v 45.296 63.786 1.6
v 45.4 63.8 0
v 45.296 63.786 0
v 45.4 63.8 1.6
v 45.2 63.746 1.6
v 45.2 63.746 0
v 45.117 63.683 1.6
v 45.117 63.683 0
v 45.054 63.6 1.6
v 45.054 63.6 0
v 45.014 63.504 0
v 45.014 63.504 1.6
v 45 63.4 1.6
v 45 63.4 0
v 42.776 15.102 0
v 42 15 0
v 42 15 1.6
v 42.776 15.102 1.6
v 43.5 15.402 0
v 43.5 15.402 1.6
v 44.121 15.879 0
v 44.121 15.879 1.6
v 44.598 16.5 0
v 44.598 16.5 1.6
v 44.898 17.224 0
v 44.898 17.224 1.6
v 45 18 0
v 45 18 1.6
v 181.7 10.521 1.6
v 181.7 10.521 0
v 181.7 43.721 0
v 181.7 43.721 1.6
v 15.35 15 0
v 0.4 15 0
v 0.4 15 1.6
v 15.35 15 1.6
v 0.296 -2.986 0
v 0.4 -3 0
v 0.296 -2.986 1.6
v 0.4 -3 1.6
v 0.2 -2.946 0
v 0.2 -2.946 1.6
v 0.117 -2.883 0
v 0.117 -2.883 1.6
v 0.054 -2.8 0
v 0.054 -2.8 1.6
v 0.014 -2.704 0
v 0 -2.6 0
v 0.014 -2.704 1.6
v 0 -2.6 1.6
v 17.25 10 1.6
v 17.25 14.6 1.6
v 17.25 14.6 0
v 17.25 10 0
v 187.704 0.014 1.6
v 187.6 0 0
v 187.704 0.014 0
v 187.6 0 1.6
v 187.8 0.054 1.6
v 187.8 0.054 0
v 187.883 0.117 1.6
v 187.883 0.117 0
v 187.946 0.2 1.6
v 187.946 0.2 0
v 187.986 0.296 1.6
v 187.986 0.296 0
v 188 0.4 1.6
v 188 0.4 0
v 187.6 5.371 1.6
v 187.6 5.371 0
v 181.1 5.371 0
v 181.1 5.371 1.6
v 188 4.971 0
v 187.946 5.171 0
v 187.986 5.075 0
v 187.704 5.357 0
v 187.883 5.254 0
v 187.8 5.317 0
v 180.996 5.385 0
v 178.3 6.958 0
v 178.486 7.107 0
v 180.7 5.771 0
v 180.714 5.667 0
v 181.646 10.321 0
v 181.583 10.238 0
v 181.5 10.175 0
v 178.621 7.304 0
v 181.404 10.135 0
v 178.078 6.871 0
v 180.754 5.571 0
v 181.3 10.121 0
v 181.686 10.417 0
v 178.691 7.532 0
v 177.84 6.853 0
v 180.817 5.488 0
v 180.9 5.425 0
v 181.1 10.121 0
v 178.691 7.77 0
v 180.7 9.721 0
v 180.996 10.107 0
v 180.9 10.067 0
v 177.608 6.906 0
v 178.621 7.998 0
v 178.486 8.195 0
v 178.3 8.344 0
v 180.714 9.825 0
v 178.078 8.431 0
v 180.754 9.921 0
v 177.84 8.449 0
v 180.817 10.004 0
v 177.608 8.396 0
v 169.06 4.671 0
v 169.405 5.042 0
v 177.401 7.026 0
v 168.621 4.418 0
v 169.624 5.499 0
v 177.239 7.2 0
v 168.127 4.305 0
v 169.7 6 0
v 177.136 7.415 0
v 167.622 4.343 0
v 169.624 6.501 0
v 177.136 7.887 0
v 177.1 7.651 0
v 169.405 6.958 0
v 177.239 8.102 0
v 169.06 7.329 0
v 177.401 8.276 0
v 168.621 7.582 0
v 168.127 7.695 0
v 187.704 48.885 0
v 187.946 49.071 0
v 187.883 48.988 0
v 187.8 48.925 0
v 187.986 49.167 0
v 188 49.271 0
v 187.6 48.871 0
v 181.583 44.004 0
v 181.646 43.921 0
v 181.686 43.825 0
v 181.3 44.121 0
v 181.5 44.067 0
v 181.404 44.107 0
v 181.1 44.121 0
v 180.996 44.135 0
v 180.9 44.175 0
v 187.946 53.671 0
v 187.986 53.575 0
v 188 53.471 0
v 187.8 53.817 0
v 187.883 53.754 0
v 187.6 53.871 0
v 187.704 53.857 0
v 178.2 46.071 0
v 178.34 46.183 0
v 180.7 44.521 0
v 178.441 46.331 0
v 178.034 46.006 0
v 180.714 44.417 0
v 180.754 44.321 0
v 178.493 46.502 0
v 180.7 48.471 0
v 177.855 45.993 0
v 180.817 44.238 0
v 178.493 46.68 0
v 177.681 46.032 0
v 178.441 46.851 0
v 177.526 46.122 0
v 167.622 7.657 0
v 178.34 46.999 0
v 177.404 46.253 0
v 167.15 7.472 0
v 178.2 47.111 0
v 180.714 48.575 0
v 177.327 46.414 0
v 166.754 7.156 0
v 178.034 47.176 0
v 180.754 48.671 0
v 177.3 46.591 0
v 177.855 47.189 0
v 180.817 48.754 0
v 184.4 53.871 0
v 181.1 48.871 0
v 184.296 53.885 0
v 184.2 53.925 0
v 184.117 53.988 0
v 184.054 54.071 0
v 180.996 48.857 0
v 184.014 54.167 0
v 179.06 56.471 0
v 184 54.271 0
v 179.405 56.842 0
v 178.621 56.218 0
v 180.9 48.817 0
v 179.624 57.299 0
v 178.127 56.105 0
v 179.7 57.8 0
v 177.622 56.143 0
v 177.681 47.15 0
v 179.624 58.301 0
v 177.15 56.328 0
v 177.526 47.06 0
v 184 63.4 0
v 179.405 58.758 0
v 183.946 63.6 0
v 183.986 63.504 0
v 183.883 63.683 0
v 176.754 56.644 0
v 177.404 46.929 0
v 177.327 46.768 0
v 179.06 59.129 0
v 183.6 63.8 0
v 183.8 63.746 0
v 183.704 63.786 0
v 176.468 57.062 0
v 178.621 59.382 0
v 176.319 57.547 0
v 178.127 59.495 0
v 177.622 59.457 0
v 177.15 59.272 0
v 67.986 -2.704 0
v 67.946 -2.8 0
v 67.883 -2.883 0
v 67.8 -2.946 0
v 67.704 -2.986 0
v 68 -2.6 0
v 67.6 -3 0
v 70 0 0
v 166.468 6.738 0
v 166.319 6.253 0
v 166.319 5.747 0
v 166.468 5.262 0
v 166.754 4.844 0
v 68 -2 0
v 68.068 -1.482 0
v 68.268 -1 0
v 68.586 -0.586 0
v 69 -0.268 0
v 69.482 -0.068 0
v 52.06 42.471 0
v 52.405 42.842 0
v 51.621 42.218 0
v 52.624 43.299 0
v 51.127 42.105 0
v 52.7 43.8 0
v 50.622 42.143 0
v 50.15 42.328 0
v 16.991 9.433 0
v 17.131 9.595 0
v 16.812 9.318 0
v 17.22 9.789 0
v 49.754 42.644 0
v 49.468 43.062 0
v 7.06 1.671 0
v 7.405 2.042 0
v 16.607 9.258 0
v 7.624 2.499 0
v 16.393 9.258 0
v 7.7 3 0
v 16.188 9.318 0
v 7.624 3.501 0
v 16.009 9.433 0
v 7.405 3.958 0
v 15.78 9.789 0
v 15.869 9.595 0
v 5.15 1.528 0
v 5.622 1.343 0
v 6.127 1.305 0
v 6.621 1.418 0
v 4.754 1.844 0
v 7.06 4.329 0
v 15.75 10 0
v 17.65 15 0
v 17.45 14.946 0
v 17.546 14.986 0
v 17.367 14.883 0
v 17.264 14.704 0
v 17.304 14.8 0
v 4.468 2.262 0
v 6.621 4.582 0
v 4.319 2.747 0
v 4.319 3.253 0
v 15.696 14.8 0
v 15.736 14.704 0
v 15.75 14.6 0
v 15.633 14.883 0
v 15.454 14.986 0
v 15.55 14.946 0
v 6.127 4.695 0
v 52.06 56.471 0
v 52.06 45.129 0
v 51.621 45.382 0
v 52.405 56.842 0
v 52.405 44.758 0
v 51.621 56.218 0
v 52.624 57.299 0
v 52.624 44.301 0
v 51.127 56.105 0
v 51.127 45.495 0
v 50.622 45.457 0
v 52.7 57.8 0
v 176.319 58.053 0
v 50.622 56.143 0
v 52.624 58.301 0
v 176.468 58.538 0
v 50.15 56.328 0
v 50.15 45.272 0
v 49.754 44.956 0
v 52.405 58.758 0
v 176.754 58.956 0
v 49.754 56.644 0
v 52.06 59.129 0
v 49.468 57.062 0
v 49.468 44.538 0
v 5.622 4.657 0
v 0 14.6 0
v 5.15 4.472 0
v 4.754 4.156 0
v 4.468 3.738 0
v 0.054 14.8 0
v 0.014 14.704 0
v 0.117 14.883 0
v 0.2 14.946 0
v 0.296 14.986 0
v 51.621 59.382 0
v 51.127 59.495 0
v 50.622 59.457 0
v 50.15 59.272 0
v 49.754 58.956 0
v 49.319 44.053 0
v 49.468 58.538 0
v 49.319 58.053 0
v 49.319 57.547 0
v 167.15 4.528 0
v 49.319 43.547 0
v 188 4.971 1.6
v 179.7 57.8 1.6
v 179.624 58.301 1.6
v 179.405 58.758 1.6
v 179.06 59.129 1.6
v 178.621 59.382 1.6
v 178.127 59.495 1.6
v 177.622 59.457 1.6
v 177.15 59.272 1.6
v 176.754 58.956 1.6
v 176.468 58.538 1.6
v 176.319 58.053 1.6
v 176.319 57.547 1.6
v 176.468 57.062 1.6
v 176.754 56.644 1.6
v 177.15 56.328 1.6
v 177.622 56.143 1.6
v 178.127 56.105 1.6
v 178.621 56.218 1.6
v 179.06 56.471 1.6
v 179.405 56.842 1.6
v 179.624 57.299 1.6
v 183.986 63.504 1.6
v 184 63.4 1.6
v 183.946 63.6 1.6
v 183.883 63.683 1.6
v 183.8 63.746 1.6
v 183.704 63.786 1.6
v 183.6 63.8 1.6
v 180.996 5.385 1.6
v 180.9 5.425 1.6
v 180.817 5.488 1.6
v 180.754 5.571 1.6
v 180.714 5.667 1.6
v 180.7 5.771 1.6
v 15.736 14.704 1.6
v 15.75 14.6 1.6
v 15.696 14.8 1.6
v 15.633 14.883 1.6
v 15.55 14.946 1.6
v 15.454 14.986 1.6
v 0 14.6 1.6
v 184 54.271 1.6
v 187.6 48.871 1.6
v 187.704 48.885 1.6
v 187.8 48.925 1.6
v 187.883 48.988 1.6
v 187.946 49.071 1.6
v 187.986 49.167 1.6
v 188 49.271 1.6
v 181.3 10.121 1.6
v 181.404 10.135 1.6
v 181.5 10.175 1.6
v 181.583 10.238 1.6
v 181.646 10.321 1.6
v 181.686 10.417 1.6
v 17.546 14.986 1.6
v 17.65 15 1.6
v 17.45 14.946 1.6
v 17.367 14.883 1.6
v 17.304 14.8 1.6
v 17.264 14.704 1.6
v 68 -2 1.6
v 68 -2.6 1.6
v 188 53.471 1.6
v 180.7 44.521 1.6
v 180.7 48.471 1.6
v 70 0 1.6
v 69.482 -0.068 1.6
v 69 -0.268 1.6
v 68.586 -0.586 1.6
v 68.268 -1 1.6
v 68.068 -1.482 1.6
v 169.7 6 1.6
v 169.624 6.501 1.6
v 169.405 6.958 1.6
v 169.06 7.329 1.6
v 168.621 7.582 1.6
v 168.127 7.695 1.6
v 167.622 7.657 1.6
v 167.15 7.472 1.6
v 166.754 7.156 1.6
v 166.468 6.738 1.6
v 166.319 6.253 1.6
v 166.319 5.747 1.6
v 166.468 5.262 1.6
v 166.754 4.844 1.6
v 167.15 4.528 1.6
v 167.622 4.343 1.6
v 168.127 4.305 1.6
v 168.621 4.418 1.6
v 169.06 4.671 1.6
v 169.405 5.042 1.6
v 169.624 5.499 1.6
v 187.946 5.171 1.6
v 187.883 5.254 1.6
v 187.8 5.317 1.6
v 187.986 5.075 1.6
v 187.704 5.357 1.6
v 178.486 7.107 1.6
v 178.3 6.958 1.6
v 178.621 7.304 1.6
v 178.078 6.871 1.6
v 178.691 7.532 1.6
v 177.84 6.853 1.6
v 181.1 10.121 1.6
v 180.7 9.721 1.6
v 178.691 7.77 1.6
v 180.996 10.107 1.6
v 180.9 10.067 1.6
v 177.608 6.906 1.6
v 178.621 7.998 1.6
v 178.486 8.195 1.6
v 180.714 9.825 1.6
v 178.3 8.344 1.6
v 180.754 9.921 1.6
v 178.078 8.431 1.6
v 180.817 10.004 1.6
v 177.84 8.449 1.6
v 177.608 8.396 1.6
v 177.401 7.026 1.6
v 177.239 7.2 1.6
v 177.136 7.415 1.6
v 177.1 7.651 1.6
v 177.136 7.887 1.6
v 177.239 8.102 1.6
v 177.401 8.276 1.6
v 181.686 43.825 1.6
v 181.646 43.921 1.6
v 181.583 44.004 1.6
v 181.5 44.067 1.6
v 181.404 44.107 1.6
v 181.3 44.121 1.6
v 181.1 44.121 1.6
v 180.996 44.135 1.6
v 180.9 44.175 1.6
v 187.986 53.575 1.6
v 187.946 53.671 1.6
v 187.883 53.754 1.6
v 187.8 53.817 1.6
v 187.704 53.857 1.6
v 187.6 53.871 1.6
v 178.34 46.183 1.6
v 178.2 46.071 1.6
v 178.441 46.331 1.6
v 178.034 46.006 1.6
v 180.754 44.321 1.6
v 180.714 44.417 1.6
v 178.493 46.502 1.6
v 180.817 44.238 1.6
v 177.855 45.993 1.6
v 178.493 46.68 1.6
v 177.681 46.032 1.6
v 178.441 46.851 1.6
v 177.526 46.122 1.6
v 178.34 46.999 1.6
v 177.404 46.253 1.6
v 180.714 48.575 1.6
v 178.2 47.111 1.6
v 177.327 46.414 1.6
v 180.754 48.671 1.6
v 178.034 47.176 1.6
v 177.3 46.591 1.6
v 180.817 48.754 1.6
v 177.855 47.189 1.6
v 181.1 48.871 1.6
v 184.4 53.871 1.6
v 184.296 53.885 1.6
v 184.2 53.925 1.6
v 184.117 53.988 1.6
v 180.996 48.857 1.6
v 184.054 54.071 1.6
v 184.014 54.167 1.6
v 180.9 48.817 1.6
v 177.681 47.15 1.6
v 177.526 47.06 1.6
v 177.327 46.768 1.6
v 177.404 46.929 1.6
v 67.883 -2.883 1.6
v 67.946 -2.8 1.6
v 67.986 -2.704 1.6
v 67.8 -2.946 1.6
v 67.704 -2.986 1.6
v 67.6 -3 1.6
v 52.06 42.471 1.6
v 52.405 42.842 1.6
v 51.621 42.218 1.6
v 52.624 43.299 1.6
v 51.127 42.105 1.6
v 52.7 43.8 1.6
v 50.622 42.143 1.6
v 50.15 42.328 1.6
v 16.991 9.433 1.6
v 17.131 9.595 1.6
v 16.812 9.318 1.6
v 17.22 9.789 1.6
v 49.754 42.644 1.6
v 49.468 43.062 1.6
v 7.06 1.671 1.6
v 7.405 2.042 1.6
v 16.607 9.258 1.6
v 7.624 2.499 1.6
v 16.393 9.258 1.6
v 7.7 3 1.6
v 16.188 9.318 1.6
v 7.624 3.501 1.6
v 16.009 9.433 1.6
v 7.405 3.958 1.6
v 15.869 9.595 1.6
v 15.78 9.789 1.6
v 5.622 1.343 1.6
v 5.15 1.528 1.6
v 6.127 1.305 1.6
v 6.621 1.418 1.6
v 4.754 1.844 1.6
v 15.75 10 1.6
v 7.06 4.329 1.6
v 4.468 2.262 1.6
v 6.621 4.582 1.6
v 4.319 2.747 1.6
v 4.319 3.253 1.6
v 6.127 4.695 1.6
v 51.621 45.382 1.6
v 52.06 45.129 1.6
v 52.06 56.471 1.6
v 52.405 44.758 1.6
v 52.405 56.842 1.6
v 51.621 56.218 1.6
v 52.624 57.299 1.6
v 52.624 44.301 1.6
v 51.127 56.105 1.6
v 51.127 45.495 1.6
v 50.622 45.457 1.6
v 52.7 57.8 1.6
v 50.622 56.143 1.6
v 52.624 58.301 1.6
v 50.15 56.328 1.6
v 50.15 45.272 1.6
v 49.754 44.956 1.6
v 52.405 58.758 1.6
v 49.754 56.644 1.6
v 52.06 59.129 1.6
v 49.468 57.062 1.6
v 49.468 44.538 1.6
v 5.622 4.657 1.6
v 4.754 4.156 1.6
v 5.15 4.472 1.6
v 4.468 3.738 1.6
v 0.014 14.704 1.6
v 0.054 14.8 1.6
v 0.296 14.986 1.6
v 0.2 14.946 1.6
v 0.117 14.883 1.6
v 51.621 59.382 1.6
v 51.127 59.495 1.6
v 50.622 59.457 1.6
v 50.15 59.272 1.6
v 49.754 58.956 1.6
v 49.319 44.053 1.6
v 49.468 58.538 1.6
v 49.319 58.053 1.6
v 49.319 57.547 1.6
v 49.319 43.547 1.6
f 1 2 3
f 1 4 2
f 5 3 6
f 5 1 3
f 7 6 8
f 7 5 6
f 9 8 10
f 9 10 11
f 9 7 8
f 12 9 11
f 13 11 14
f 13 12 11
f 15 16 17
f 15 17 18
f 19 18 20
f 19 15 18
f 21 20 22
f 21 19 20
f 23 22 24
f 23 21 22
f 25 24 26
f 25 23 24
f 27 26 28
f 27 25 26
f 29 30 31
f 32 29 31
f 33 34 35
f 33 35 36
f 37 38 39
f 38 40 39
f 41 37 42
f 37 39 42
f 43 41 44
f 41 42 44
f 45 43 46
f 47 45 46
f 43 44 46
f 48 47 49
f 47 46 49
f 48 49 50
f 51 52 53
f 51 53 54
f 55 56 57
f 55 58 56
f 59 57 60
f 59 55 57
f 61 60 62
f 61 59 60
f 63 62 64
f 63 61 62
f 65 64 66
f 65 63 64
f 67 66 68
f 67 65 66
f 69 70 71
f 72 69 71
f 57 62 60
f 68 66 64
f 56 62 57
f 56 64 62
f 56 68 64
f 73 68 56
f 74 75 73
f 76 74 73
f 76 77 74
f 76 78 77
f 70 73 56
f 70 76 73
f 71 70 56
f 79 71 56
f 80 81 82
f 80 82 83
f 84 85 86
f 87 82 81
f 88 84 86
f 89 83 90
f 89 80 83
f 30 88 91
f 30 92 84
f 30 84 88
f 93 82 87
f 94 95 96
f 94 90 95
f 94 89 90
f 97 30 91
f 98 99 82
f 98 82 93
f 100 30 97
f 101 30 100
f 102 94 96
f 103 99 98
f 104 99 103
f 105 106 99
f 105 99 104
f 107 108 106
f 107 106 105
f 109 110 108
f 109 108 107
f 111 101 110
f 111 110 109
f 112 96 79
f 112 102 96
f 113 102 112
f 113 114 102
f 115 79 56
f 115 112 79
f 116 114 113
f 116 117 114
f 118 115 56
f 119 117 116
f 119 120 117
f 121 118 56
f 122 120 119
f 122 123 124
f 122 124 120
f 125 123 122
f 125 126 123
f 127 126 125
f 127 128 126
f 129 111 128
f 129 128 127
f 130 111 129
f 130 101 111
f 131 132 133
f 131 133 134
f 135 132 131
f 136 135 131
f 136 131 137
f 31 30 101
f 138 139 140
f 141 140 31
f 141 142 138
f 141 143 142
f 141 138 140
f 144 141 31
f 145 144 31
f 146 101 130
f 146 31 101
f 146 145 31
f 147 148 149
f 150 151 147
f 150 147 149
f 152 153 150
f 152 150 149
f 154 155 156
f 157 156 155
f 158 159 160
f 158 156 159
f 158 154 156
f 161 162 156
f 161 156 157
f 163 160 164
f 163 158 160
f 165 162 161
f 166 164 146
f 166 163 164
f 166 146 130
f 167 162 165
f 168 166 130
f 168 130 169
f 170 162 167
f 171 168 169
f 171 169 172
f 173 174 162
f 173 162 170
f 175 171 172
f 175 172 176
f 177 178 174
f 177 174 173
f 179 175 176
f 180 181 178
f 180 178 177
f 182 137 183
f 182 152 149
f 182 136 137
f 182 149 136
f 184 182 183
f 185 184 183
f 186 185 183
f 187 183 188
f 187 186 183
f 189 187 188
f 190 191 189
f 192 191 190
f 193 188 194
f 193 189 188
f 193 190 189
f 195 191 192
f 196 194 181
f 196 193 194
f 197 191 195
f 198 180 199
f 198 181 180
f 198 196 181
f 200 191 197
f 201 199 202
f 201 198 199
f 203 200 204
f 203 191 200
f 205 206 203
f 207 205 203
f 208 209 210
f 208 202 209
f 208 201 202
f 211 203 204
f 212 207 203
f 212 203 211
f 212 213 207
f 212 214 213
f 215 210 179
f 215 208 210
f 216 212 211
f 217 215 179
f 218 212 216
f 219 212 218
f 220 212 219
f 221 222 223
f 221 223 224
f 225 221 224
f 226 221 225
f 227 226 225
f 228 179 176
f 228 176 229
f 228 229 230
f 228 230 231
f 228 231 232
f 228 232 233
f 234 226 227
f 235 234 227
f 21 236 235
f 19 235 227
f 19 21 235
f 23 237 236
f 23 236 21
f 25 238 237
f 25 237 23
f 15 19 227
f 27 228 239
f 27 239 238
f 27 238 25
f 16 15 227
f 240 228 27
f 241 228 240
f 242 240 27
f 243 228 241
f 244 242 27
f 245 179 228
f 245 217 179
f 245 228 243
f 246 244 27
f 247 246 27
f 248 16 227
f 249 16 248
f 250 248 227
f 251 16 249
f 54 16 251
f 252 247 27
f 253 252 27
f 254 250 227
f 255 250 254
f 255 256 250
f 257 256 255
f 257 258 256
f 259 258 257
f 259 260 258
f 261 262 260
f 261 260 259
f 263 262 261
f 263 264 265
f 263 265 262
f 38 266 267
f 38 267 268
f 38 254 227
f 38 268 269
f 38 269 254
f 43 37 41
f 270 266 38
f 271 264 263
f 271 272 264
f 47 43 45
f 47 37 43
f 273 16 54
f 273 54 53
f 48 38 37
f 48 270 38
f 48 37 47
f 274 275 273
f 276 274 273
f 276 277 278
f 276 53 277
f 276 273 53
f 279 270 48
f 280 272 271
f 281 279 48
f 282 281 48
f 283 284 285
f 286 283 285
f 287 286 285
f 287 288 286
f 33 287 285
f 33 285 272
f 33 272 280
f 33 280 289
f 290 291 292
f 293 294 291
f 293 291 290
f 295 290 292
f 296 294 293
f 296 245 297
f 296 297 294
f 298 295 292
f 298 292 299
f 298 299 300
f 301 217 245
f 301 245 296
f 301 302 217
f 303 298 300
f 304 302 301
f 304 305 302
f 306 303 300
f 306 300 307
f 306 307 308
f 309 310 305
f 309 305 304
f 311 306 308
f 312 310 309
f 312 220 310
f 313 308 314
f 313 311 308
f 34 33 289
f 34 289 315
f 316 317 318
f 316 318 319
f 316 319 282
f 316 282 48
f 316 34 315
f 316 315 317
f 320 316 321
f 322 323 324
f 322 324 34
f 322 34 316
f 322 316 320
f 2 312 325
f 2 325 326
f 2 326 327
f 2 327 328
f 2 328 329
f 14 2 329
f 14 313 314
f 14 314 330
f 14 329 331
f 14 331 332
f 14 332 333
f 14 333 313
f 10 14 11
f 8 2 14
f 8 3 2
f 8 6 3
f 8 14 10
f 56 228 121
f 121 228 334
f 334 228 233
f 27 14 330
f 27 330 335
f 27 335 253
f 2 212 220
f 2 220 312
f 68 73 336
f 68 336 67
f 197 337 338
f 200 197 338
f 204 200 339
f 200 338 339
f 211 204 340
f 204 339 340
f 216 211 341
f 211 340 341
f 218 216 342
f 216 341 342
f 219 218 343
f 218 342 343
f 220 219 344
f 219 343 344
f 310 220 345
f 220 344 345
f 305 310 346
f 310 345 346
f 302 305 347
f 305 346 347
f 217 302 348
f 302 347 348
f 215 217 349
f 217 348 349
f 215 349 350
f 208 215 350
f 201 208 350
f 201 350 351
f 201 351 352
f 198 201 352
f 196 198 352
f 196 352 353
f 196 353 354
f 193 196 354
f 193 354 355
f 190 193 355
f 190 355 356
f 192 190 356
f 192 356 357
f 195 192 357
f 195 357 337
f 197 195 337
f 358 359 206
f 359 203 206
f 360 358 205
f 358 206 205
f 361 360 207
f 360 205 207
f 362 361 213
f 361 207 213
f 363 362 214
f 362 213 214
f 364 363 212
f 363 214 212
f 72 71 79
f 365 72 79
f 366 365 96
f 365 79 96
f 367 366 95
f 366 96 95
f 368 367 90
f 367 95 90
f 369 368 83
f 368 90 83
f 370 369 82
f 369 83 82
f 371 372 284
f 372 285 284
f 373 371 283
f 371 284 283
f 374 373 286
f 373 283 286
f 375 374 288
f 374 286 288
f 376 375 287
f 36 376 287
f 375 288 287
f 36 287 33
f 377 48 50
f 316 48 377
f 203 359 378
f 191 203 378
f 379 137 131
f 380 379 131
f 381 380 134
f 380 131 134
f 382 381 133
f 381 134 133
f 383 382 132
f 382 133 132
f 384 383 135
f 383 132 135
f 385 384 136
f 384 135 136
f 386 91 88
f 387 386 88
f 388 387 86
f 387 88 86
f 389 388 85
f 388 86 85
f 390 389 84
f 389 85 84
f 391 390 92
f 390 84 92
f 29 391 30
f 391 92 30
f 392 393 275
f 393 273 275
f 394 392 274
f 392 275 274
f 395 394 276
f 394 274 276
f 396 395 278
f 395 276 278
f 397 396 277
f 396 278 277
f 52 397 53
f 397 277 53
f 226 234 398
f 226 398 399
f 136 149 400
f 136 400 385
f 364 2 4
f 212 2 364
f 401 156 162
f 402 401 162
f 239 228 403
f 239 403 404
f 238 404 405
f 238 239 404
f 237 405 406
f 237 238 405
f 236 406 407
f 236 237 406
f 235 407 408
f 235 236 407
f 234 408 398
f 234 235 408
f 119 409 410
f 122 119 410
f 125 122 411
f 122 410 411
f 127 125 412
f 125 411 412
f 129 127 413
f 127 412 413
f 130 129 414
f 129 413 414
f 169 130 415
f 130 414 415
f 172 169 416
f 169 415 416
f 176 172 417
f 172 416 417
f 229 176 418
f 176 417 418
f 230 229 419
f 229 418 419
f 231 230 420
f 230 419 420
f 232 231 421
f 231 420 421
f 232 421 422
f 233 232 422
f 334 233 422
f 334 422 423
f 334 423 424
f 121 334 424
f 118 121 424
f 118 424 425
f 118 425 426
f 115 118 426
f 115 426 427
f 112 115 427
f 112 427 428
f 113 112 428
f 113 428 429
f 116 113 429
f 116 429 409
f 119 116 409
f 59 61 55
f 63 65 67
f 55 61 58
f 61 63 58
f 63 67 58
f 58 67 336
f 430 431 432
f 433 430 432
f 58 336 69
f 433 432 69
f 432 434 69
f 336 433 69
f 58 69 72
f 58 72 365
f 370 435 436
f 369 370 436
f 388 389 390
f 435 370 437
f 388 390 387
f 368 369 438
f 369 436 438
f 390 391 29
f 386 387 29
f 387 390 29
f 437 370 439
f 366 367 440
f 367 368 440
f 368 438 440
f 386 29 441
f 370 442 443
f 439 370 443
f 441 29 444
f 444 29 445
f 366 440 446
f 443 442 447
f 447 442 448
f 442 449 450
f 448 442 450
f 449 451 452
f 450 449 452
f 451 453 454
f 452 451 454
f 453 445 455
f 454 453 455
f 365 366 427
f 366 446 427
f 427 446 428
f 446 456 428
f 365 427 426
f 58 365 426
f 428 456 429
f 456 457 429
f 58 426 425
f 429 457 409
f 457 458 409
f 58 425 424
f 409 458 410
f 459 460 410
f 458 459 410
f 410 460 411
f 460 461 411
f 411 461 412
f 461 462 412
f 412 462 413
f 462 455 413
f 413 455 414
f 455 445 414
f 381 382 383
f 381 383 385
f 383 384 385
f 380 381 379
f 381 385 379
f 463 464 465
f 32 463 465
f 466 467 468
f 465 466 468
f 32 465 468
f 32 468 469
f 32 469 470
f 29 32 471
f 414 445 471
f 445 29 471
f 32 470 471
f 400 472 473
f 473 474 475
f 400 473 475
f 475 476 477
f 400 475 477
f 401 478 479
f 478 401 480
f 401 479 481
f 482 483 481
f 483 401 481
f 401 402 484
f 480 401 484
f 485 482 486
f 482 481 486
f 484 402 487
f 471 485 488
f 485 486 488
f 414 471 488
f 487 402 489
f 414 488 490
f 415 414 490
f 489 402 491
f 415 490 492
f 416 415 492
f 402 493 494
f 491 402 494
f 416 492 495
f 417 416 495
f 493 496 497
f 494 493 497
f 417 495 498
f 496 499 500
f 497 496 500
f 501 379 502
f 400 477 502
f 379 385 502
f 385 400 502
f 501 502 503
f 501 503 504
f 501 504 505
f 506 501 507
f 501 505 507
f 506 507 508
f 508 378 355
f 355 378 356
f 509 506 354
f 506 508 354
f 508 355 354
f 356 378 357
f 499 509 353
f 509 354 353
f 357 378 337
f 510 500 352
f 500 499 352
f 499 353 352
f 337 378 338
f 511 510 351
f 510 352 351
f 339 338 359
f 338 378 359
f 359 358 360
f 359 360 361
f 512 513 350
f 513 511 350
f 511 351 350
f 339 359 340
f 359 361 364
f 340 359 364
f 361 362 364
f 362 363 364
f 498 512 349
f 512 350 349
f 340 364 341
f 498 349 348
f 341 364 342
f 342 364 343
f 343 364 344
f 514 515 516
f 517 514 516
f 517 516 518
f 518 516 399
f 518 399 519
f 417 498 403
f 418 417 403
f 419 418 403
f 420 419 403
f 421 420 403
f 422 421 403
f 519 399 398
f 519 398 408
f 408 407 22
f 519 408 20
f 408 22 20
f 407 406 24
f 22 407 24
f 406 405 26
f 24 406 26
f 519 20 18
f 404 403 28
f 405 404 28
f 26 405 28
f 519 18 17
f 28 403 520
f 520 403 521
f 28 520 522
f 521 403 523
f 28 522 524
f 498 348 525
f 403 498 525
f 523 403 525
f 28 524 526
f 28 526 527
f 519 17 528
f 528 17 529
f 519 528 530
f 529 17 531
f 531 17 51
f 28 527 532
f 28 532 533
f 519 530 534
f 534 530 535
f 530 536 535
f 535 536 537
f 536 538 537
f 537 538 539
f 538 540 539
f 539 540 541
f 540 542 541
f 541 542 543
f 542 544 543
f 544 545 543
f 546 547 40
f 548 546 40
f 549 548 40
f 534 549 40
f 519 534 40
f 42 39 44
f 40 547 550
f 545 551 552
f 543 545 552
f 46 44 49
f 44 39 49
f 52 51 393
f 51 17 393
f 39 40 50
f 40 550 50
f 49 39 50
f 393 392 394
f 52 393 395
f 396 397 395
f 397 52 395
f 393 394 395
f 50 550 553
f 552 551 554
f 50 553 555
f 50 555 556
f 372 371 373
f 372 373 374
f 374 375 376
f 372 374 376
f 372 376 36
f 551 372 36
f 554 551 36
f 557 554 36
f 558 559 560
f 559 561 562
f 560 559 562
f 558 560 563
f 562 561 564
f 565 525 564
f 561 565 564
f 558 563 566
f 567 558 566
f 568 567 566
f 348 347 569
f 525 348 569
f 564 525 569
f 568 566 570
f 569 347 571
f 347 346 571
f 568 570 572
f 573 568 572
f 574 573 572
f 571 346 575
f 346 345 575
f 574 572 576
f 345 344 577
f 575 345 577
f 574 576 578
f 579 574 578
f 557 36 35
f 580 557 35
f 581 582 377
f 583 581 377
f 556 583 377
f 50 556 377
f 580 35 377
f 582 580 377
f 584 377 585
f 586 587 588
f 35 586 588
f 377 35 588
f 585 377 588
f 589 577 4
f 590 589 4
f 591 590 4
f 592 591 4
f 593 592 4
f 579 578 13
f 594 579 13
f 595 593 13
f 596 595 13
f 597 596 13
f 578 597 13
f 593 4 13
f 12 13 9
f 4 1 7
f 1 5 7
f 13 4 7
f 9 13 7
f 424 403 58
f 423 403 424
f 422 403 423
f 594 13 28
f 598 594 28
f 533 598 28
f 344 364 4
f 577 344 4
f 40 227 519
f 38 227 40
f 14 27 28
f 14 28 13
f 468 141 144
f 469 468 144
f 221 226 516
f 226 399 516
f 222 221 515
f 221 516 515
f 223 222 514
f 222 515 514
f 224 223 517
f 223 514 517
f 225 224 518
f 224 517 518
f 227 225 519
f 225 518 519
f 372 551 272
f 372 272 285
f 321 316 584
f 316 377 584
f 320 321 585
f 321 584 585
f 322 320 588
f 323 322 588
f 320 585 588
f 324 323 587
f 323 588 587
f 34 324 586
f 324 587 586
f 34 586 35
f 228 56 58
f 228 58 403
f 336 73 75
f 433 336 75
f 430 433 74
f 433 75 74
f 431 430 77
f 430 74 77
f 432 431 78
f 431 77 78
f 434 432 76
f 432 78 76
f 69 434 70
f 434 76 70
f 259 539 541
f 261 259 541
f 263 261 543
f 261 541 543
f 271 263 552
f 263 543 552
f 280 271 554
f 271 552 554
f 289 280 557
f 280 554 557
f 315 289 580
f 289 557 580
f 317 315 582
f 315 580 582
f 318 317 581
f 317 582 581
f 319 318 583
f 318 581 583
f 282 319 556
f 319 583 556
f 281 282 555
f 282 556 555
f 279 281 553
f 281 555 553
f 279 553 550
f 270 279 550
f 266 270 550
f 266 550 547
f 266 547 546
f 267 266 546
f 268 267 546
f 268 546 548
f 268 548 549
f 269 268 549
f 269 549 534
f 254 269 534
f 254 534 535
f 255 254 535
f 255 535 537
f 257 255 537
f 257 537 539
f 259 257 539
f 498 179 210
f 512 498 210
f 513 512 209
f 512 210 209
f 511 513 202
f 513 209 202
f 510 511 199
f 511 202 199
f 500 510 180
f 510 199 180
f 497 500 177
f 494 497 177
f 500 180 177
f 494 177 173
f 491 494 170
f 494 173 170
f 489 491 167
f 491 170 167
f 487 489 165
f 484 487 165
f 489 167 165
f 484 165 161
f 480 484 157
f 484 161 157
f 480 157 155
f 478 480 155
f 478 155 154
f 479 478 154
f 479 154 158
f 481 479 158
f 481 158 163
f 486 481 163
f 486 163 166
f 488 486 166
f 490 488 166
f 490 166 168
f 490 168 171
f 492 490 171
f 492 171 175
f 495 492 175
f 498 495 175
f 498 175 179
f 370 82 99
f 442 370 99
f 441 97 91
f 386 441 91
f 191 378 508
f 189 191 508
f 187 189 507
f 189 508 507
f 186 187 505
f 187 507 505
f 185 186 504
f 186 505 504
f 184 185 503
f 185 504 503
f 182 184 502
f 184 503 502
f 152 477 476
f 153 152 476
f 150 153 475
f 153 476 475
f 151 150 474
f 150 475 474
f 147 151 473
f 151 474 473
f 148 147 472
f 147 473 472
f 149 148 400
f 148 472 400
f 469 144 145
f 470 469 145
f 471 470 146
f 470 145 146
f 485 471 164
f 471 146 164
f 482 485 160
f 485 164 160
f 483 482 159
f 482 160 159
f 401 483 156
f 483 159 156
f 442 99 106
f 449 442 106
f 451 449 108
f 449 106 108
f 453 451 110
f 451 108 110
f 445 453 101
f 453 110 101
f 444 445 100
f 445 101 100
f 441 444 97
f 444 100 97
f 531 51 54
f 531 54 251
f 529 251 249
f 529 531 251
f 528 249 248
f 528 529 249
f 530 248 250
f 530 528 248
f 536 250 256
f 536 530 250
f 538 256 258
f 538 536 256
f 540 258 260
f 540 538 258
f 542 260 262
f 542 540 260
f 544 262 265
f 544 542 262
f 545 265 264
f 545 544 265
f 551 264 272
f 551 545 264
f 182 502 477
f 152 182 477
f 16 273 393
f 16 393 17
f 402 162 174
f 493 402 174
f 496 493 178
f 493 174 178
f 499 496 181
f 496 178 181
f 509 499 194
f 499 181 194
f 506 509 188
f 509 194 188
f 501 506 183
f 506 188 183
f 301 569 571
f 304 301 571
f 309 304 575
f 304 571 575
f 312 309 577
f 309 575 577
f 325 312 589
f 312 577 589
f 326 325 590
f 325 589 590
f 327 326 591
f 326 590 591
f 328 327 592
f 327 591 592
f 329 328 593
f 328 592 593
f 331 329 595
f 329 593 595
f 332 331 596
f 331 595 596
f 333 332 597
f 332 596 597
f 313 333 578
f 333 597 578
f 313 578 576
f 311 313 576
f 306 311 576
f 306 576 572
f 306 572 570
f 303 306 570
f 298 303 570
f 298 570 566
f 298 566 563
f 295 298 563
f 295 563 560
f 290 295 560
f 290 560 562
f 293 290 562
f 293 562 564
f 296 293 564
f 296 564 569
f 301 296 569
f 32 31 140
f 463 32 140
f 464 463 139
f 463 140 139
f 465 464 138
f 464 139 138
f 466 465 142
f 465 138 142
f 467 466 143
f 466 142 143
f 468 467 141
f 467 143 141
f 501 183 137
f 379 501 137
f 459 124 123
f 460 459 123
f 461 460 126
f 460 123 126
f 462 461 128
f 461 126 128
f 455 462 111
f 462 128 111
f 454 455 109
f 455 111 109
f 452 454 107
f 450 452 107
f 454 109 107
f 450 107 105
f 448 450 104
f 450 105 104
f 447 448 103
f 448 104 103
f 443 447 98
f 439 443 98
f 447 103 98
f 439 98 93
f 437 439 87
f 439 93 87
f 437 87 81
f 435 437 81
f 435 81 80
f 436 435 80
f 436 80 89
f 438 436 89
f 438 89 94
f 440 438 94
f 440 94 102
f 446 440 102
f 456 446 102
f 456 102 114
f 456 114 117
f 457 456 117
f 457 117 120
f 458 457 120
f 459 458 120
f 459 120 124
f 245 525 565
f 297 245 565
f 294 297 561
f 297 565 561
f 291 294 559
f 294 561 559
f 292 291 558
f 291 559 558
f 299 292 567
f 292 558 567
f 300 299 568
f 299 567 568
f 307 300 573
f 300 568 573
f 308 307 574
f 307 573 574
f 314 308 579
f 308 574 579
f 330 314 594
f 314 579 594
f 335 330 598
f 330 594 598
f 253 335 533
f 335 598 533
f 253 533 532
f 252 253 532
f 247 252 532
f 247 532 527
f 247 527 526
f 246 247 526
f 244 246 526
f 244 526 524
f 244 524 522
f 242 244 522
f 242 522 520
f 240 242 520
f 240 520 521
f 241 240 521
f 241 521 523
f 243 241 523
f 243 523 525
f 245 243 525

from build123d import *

# Parameters (mm, degrees)
BOSS_EXTRUDE1_DEPTH  = 1.6
SKETCH4_R            = 0.6
SKETCH4_R_2          = 0.8
CUT_EXTRUDE1_DEPTH   = 2.6
CUT_EXTRUDE2_DEPTH   = 2.6
CUT_EXTRUDE3_DEPTH   = 2.6
FILLET1_R            = 0.4
M3_CLEARANCE_HOLE1_D = 3.4


with BuildPart() as part:
    # Sketch2 → Boss-Extrude1 (new body)
    with BuildSketch(Plane.XY):
        with BuildLine():
            Line((68, -2), (68, -3))
            Line((68, -3), (0, -3))
            Line((0, -3), (0, 0))
            Line((0, 0), (0, 15))
            Line((0, 15), (42, 15))
            ThreePointArc((42, 15), (44.121320344, 15.878679656), (45, 18))
            Line((45, 18), (45, 63.8))
            Line((45, 63.8), (188, 63.8))
            Line((188, 63.8), (188, 0))
            Line((188, 0), (70, 0))
            ThreePointArc((70, 0), (68.585786438, -0.585786438), (68, -2))
        make_face()
    extrude(amount=BOSS_EXTRUDE1_DEPTH)

    # Sketch4 → Cut-Extrude1 (cut, through all)
    with BuildSketch(Plane(origin=(0, 0, 0), x_dir=(-1, 0, 0), z_dir=(0, 0, -1))):
        with Locations((-177.9, 46.591)):
            Circle(SKETCH4_R)
        with Locations((-177.9, 7.651)):
            Circle(SKETCH4_R_2)
        with BuildLine():
            Line((-188, 49.271), (-188, 48.871))
            Line((-188, 48.871), (-188, 5.371))
            Line((-188, 5.371), (-188, 4.971))
            ThreePointArc((-188, 4.971), (-187.882842712, 5.253842712), (-187.6, 5.371))
            Line((-187.6, 5.371), (-181.1, 5.371))
            ThreePointArc((-181.1, 5.371), (-180.817157288, 5.488157288), (-180.7, 5.771))
            Line((-180.7, 5.771), (-180.7, 9.721))
            ThreePointArc((-180.7, 9.721), (-180.817157288, 10.003842712), (-181.1, 10.121))
            Line((-181.1, 10.121), (-181.3, 10.121))
            ThreePointArc((-181.3, 10.121), (-181.582842712, 10.238157288), (-181.7, 10.521))
            Line((-181.7, 10.521), (-181.7, 43.721))
            ThreePointArc((-181.7, 43.721), (-181.582842712, 44.003842712), (-181.3, 44.121))
            Line((-181.3, 44.121), (-181.1, 44.121))
            ThreePointArc((-181.1, 44.121), (-180.817157288, 44.238157288), (-180.7, 44.521))
            Line((-180.7, 44.521), (-180.7, 48.471))
            ThreePointArc((-180.7, 48.471), (-180.817157288, 48.753842712), (-181.1, 48.871))
            Line((-181.1, 48.871), (-187.6, 48.871))
            ThreePointArc((-187.6, 48.871), (-187.882842712, 48.988157288), (-188, 49.271))
        make_face()
    extrude(amount=-CUT_EXTRUDE1_DEPTH, mode=Mode.SUBTRACT)

    # Sketch5 → Cut-Extrude2 (cut, through all)
    with BuildSketch(Plane.XY.offset(1.6)):
        with BuildLine():
            Line((15.75, 15), (17.25, 15))
            Line((17.25, 15), (17.25, 10))
            ThreePointArc((17.25, 10), (16.5, 9.25), (15.75, 10))
            Line((15.75, 10), (15.75, 15))
        make_face()
    extrude(amount=-CUT_EXTRUDE2_DEPTH, mode=Mode.SUBTRACT)

    # Sketch6 → Cut-Extrude3 (cut, through all)
    with BuildSketch(Plane.XY.offset(1.6)):
        with BuildLine():
            Line((188, 63.8), (184, 63.8))
            Line((184, 63.8), (184, 54.271))
            ThreePointArc((184, 54.271), (184.117157288, 53.988157288), (184.4, 53.871))
            Line((184.4, 53.871), (187.6, 53.871))
            ThreePointArc((187.6, 53.871), (187.882842712, 53.753842712), (188, 53.471))
            Line((188, 53.471), (188, 53.871))
            Line((188, 53.871), (188, 63.8))
        make_face()
    extrude(amount=-CUT_EXTRUDE3_DEPTH, mode=Mode.SUBTRACT)

    # Fillet1
    fillet1_edges = [part.edges().sort_by_distance(p)[0] for p in [
        (15.75, 15, 0.8),
        (17.25, 15, 0.8),
        (184, 63.8, 0.8),
        (0, 15, 0.8),
        (45, 63.8, 0.8),
        (188, 0, 0.8),
        (68, -3, 0.8),
        (0, -3, 0.8),
    ]]
    fillet(fillet1_edges, radius=FILLET1_R)

    # M3 Clearance Hole1 (through all)
    with Locations(Plane(origin=(0, 0, 0), x_dir=(-1, 0, 0), z_dir=(0, 0, -1))):
        with Locations((-178, 57.8), (-51, 57.8), (-6, 3), (-168, 6), (-51, 43.8)):
            Hole(M3_CLEARANCE_HOLE1_D / 2)


solid = part.part
